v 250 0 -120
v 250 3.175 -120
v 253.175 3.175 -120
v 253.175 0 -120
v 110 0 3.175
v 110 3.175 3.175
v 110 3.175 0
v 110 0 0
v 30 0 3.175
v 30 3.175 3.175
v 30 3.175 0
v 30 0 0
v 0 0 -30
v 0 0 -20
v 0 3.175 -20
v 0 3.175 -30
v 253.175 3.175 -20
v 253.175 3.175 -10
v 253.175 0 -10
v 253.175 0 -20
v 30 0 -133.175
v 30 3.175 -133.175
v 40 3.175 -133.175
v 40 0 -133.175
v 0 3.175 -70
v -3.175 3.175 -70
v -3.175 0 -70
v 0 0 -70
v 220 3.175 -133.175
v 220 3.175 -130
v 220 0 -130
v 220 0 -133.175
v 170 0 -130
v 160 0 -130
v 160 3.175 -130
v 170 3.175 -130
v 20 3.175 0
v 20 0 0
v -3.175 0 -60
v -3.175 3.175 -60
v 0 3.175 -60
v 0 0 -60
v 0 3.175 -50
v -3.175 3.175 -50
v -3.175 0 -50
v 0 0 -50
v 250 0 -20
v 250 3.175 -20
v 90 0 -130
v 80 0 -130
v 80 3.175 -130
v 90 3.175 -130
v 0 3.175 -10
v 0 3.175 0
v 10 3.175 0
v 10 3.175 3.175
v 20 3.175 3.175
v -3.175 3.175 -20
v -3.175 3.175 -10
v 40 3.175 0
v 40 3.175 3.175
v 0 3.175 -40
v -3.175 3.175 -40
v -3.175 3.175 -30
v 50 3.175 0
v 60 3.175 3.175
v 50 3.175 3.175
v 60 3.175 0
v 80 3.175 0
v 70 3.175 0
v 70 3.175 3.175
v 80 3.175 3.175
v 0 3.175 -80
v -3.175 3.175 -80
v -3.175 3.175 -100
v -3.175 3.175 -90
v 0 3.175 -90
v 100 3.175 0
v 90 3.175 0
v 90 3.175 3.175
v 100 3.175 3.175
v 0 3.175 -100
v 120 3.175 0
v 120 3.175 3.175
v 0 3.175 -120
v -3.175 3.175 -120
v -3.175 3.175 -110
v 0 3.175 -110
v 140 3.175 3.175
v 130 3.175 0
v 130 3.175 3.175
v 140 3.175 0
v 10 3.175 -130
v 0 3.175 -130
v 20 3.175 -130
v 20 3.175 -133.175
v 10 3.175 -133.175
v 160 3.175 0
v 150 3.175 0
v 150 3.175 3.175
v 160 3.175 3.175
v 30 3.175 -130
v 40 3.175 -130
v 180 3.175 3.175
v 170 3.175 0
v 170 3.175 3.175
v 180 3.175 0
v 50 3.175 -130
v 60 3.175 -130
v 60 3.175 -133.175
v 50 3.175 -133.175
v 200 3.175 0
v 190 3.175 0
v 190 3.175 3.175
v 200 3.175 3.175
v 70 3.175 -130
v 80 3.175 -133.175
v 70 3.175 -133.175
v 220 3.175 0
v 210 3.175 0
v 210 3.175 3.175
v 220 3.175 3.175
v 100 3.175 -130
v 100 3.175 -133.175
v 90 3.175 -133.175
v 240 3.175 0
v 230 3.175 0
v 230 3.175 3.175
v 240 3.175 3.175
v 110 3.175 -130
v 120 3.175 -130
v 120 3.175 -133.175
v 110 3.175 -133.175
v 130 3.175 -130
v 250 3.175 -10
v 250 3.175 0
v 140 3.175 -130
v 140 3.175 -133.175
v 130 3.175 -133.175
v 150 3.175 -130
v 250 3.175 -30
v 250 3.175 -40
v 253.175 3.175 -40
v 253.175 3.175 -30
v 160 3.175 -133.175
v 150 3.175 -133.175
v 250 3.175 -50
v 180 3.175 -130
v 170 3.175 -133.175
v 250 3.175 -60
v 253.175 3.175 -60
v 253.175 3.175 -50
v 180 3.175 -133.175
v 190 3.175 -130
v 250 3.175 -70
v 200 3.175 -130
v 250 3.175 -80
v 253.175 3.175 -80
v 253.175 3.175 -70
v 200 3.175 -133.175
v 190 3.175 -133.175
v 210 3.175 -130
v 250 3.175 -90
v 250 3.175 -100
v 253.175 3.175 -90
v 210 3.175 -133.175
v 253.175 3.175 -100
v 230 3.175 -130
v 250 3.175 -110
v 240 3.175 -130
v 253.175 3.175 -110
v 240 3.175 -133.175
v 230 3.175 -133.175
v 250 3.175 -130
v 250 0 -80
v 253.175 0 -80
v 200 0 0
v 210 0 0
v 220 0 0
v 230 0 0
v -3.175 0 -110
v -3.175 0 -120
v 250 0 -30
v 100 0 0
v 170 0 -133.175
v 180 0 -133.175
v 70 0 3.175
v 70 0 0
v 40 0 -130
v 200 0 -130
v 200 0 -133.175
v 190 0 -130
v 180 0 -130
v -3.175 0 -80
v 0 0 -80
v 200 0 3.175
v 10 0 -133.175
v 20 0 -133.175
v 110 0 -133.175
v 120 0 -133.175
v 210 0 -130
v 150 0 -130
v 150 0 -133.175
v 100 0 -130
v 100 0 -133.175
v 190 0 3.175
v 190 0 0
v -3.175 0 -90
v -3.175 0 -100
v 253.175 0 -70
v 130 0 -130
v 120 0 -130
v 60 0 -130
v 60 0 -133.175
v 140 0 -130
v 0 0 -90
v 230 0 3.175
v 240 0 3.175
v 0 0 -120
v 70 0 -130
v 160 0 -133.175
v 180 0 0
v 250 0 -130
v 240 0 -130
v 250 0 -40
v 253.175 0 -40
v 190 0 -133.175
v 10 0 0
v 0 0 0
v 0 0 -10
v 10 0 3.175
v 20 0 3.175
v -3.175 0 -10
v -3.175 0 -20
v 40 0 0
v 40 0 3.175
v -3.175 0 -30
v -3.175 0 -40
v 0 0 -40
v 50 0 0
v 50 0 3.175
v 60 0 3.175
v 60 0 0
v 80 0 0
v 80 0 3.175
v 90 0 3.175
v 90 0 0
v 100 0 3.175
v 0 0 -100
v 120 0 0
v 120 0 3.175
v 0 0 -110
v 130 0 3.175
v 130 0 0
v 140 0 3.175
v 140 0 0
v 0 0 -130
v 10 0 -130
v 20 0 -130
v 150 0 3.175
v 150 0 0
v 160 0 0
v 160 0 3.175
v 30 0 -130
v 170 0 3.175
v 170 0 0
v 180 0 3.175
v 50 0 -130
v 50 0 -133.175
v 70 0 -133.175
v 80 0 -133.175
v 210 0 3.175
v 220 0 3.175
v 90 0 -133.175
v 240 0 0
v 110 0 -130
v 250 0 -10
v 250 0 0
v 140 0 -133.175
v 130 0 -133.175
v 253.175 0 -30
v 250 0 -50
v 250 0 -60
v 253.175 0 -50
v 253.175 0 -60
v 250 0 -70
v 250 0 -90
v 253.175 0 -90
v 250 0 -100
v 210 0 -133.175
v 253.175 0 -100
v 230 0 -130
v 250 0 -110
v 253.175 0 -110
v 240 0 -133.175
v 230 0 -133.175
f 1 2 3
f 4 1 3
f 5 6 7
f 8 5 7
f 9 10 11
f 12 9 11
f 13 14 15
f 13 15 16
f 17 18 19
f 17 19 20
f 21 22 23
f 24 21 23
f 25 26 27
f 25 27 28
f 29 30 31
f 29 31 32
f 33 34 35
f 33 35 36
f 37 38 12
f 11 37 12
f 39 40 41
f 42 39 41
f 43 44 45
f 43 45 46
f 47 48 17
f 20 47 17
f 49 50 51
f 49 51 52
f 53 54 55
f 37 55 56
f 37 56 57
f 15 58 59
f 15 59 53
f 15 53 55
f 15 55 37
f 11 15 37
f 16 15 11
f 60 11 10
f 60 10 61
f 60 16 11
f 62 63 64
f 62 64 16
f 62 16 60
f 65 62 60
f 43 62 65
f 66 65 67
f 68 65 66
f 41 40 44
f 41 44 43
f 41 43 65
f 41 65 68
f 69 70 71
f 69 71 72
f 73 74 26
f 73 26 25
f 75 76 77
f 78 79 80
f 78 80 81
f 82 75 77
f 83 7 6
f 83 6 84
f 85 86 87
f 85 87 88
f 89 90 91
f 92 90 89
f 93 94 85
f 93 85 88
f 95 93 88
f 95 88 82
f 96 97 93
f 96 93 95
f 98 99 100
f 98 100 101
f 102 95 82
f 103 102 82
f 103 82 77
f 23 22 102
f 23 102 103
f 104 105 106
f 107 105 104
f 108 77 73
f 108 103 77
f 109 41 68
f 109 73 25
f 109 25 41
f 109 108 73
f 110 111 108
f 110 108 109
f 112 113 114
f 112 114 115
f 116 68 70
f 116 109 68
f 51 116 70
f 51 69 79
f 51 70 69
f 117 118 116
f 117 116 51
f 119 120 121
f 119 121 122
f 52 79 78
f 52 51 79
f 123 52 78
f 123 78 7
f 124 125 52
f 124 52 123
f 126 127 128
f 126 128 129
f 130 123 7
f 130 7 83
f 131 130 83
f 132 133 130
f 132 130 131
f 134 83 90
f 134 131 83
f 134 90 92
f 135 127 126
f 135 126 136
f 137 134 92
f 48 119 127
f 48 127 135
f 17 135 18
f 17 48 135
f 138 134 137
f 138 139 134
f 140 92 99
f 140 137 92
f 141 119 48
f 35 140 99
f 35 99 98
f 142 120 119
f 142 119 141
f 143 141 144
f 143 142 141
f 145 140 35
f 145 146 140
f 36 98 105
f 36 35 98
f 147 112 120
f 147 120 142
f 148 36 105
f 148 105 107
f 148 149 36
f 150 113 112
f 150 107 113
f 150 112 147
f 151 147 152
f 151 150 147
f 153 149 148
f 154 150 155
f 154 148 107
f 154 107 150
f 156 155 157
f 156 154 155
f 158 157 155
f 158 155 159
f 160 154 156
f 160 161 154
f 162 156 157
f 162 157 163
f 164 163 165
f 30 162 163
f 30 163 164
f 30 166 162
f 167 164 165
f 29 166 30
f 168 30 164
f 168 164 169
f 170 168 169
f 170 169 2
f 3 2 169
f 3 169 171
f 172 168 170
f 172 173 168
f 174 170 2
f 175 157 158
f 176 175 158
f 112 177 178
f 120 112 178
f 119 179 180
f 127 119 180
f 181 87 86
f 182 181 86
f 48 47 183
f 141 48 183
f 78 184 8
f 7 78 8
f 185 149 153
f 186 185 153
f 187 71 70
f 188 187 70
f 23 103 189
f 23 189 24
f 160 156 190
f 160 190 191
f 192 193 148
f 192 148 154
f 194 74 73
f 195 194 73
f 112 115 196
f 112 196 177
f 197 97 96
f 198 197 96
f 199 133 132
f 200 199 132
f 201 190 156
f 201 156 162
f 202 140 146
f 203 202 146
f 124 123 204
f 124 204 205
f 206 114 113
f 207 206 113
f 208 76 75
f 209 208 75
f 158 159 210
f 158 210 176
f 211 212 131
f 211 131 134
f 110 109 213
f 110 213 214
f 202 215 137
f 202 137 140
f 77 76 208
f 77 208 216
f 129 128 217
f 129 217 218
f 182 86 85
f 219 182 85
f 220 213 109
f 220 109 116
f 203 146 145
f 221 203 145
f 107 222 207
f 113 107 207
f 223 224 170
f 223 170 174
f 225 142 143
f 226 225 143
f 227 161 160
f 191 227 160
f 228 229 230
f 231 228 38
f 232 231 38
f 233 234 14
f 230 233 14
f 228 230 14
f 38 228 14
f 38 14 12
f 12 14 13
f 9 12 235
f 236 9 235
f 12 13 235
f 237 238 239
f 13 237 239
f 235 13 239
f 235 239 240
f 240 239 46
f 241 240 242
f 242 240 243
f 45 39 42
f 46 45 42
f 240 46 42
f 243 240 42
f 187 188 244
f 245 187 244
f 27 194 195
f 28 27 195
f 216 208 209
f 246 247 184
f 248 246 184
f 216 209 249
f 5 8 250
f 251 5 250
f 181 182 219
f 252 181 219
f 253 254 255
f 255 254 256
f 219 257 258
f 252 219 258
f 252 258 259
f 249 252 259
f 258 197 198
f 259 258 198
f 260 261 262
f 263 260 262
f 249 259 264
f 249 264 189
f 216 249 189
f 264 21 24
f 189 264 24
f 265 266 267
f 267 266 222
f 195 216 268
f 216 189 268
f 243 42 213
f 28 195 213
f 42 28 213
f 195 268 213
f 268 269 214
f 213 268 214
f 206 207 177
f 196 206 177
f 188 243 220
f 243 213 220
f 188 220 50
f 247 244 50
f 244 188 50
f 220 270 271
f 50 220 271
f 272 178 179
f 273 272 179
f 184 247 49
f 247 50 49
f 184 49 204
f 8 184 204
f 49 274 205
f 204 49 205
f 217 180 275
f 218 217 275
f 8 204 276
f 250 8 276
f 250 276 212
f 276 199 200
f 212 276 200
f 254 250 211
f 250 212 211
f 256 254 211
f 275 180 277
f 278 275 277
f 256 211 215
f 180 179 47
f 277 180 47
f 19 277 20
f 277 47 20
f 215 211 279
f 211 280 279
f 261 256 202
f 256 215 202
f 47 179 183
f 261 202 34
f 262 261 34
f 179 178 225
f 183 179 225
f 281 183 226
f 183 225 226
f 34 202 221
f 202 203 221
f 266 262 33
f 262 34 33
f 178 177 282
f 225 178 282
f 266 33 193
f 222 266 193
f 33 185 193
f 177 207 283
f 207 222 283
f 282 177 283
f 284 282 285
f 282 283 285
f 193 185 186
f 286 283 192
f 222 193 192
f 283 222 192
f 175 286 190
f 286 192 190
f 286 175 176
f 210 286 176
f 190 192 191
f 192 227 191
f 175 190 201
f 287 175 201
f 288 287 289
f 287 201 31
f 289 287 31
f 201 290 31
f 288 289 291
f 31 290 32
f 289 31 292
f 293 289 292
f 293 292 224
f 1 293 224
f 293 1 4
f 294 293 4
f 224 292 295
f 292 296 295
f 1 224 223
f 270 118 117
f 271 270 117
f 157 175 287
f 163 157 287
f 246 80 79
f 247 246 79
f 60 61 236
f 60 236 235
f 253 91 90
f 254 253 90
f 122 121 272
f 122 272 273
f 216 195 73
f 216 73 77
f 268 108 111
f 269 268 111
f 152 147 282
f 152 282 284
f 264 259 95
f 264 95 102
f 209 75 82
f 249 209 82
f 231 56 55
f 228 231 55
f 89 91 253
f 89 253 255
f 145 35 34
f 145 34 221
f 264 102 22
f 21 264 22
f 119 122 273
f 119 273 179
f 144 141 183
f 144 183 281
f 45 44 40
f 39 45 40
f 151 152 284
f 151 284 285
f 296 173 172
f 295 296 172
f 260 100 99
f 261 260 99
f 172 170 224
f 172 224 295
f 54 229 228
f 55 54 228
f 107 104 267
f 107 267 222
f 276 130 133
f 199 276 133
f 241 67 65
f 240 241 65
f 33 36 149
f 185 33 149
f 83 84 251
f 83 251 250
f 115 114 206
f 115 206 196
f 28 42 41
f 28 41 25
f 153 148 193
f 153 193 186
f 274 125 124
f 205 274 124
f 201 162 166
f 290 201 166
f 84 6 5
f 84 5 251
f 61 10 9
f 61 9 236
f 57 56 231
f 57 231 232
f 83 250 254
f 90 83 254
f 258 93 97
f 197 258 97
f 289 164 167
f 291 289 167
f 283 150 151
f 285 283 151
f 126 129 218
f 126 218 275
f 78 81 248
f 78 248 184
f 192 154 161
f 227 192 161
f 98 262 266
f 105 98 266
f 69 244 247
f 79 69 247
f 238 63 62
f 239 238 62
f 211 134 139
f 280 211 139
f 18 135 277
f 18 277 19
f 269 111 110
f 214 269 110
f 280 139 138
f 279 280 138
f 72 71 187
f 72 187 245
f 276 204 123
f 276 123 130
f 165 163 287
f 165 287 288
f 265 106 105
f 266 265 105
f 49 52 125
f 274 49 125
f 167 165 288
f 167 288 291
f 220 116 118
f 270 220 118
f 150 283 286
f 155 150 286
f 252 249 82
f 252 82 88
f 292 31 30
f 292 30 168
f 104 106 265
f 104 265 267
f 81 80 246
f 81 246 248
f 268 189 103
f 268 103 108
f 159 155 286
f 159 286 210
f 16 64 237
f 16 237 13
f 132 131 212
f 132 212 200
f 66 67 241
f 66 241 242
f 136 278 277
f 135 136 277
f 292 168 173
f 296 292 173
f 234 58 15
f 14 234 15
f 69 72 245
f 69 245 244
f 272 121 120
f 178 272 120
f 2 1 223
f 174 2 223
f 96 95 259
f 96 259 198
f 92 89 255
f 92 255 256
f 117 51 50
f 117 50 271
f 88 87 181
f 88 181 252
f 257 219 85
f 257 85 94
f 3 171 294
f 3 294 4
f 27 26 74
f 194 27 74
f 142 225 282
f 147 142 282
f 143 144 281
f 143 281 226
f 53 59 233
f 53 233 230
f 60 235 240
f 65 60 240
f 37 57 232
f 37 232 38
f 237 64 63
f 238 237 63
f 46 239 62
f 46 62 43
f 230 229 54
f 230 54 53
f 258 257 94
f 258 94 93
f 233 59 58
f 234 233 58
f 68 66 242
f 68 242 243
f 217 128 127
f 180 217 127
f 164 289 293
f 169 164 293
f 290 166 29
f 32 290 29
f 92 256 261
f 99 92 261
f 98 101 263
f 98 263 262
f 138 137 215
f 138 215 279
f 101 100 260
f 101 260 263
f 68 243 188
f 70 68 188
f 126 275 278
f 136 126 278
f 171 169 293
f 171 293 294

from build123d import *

# Parameters (mm, degrees)
ESQUISSE1_W                = 250
ESQUISSE1_H                = 130
BOSS_EXTRU_1_DEPTH         = 3.175
ESQUISSE2_W                = 10
ESQUISSE2_H                = 3.175
BOSS_EXTRU_2_DEPTH         = 3.175
R_P_TITION_LIN_AIRE1_COUNT = 12
R_P_TITION_LIN_AIRE1_PITCH = 20
ESQUISSE3_W                = 3.175
ESQUISSE3_H                = 10
BOSS_EXTRU_3_DEPTH         = 3.175
R_P_TITION_LIN_AIRE2_COUNT = 6
R_P_TITION_LIN_AIRE2_PITCH = 20


with BuildPart() as part:
    # Esquisse1 → Boss.-Extru.1 (new body)
    with BuildSketch(Plane(origin=(0, 0, 0), x_dir=(1, 0, 0), z_dir=(0, 1, 0))):
        with Locations((125, 65)):
            Rectangle(ESQUISSE1_W, ESQUISSE1_H)
    extrude(amount=BOSS_EXTRU_1_DEPTH)

    # Esquisse2 → Boss.-Extru.2 (add)
    with BuildSketch(Plane(origin=(0, 3.175, 0), x_dir=(1, 0, 0), z_dir=(0, 1, 0))):
        with Locations((15, 131.5875)):
            Rectangle(ESQUISSE2_W, ESQUISSE2_H)
        with Locations((15, -1.5875)):
            Rectangle(ESQUISSE2_W, ESQUISSE2_H)
    boss_extru_2 = extrude(amount=-BOSS_EXTRU_2_DEPTH)

    # Répétition linéaire1: Boss.-Extru.2 ×12
    with Locations(*[(i * R_P_TITION_LIN_AIRE1_PITCH, 0, 0) for i in range(1, R_P_TITION_LIN_AIRE1_COUNT)]):
        add(boss_extru_2)

    # Esquisse3 → Boss.-Extru.3 (add)
    with BuildSketch(Plane(origin=(0, 3.175, 0), x_dir=(1, 0, 0), z_dir=(0, 1, 0))):
        with Locations((251.5875, 115)):
            Rectangle(ESQUISSE3_W, ESQUISSE3_H)
        with Locations((-1.5875, 115)):
            Rectangle(ESQUISSE3_W, ESQUISSE3_H)
    boss_extru_3 = extrude(amount=-BOSS_EXTRU_3_DEPTH)

    # Répétition linéaire2: Boss.-Extru.3 ×6
    with Locations(*[(0, 0, i * R_P_TITION_LIN_AIRE2_PITCH) for i in range(1, R_P_TITION_LIN_AIRE2_COUNT)]):
        add(boss_extru_3)


solid = part.part
